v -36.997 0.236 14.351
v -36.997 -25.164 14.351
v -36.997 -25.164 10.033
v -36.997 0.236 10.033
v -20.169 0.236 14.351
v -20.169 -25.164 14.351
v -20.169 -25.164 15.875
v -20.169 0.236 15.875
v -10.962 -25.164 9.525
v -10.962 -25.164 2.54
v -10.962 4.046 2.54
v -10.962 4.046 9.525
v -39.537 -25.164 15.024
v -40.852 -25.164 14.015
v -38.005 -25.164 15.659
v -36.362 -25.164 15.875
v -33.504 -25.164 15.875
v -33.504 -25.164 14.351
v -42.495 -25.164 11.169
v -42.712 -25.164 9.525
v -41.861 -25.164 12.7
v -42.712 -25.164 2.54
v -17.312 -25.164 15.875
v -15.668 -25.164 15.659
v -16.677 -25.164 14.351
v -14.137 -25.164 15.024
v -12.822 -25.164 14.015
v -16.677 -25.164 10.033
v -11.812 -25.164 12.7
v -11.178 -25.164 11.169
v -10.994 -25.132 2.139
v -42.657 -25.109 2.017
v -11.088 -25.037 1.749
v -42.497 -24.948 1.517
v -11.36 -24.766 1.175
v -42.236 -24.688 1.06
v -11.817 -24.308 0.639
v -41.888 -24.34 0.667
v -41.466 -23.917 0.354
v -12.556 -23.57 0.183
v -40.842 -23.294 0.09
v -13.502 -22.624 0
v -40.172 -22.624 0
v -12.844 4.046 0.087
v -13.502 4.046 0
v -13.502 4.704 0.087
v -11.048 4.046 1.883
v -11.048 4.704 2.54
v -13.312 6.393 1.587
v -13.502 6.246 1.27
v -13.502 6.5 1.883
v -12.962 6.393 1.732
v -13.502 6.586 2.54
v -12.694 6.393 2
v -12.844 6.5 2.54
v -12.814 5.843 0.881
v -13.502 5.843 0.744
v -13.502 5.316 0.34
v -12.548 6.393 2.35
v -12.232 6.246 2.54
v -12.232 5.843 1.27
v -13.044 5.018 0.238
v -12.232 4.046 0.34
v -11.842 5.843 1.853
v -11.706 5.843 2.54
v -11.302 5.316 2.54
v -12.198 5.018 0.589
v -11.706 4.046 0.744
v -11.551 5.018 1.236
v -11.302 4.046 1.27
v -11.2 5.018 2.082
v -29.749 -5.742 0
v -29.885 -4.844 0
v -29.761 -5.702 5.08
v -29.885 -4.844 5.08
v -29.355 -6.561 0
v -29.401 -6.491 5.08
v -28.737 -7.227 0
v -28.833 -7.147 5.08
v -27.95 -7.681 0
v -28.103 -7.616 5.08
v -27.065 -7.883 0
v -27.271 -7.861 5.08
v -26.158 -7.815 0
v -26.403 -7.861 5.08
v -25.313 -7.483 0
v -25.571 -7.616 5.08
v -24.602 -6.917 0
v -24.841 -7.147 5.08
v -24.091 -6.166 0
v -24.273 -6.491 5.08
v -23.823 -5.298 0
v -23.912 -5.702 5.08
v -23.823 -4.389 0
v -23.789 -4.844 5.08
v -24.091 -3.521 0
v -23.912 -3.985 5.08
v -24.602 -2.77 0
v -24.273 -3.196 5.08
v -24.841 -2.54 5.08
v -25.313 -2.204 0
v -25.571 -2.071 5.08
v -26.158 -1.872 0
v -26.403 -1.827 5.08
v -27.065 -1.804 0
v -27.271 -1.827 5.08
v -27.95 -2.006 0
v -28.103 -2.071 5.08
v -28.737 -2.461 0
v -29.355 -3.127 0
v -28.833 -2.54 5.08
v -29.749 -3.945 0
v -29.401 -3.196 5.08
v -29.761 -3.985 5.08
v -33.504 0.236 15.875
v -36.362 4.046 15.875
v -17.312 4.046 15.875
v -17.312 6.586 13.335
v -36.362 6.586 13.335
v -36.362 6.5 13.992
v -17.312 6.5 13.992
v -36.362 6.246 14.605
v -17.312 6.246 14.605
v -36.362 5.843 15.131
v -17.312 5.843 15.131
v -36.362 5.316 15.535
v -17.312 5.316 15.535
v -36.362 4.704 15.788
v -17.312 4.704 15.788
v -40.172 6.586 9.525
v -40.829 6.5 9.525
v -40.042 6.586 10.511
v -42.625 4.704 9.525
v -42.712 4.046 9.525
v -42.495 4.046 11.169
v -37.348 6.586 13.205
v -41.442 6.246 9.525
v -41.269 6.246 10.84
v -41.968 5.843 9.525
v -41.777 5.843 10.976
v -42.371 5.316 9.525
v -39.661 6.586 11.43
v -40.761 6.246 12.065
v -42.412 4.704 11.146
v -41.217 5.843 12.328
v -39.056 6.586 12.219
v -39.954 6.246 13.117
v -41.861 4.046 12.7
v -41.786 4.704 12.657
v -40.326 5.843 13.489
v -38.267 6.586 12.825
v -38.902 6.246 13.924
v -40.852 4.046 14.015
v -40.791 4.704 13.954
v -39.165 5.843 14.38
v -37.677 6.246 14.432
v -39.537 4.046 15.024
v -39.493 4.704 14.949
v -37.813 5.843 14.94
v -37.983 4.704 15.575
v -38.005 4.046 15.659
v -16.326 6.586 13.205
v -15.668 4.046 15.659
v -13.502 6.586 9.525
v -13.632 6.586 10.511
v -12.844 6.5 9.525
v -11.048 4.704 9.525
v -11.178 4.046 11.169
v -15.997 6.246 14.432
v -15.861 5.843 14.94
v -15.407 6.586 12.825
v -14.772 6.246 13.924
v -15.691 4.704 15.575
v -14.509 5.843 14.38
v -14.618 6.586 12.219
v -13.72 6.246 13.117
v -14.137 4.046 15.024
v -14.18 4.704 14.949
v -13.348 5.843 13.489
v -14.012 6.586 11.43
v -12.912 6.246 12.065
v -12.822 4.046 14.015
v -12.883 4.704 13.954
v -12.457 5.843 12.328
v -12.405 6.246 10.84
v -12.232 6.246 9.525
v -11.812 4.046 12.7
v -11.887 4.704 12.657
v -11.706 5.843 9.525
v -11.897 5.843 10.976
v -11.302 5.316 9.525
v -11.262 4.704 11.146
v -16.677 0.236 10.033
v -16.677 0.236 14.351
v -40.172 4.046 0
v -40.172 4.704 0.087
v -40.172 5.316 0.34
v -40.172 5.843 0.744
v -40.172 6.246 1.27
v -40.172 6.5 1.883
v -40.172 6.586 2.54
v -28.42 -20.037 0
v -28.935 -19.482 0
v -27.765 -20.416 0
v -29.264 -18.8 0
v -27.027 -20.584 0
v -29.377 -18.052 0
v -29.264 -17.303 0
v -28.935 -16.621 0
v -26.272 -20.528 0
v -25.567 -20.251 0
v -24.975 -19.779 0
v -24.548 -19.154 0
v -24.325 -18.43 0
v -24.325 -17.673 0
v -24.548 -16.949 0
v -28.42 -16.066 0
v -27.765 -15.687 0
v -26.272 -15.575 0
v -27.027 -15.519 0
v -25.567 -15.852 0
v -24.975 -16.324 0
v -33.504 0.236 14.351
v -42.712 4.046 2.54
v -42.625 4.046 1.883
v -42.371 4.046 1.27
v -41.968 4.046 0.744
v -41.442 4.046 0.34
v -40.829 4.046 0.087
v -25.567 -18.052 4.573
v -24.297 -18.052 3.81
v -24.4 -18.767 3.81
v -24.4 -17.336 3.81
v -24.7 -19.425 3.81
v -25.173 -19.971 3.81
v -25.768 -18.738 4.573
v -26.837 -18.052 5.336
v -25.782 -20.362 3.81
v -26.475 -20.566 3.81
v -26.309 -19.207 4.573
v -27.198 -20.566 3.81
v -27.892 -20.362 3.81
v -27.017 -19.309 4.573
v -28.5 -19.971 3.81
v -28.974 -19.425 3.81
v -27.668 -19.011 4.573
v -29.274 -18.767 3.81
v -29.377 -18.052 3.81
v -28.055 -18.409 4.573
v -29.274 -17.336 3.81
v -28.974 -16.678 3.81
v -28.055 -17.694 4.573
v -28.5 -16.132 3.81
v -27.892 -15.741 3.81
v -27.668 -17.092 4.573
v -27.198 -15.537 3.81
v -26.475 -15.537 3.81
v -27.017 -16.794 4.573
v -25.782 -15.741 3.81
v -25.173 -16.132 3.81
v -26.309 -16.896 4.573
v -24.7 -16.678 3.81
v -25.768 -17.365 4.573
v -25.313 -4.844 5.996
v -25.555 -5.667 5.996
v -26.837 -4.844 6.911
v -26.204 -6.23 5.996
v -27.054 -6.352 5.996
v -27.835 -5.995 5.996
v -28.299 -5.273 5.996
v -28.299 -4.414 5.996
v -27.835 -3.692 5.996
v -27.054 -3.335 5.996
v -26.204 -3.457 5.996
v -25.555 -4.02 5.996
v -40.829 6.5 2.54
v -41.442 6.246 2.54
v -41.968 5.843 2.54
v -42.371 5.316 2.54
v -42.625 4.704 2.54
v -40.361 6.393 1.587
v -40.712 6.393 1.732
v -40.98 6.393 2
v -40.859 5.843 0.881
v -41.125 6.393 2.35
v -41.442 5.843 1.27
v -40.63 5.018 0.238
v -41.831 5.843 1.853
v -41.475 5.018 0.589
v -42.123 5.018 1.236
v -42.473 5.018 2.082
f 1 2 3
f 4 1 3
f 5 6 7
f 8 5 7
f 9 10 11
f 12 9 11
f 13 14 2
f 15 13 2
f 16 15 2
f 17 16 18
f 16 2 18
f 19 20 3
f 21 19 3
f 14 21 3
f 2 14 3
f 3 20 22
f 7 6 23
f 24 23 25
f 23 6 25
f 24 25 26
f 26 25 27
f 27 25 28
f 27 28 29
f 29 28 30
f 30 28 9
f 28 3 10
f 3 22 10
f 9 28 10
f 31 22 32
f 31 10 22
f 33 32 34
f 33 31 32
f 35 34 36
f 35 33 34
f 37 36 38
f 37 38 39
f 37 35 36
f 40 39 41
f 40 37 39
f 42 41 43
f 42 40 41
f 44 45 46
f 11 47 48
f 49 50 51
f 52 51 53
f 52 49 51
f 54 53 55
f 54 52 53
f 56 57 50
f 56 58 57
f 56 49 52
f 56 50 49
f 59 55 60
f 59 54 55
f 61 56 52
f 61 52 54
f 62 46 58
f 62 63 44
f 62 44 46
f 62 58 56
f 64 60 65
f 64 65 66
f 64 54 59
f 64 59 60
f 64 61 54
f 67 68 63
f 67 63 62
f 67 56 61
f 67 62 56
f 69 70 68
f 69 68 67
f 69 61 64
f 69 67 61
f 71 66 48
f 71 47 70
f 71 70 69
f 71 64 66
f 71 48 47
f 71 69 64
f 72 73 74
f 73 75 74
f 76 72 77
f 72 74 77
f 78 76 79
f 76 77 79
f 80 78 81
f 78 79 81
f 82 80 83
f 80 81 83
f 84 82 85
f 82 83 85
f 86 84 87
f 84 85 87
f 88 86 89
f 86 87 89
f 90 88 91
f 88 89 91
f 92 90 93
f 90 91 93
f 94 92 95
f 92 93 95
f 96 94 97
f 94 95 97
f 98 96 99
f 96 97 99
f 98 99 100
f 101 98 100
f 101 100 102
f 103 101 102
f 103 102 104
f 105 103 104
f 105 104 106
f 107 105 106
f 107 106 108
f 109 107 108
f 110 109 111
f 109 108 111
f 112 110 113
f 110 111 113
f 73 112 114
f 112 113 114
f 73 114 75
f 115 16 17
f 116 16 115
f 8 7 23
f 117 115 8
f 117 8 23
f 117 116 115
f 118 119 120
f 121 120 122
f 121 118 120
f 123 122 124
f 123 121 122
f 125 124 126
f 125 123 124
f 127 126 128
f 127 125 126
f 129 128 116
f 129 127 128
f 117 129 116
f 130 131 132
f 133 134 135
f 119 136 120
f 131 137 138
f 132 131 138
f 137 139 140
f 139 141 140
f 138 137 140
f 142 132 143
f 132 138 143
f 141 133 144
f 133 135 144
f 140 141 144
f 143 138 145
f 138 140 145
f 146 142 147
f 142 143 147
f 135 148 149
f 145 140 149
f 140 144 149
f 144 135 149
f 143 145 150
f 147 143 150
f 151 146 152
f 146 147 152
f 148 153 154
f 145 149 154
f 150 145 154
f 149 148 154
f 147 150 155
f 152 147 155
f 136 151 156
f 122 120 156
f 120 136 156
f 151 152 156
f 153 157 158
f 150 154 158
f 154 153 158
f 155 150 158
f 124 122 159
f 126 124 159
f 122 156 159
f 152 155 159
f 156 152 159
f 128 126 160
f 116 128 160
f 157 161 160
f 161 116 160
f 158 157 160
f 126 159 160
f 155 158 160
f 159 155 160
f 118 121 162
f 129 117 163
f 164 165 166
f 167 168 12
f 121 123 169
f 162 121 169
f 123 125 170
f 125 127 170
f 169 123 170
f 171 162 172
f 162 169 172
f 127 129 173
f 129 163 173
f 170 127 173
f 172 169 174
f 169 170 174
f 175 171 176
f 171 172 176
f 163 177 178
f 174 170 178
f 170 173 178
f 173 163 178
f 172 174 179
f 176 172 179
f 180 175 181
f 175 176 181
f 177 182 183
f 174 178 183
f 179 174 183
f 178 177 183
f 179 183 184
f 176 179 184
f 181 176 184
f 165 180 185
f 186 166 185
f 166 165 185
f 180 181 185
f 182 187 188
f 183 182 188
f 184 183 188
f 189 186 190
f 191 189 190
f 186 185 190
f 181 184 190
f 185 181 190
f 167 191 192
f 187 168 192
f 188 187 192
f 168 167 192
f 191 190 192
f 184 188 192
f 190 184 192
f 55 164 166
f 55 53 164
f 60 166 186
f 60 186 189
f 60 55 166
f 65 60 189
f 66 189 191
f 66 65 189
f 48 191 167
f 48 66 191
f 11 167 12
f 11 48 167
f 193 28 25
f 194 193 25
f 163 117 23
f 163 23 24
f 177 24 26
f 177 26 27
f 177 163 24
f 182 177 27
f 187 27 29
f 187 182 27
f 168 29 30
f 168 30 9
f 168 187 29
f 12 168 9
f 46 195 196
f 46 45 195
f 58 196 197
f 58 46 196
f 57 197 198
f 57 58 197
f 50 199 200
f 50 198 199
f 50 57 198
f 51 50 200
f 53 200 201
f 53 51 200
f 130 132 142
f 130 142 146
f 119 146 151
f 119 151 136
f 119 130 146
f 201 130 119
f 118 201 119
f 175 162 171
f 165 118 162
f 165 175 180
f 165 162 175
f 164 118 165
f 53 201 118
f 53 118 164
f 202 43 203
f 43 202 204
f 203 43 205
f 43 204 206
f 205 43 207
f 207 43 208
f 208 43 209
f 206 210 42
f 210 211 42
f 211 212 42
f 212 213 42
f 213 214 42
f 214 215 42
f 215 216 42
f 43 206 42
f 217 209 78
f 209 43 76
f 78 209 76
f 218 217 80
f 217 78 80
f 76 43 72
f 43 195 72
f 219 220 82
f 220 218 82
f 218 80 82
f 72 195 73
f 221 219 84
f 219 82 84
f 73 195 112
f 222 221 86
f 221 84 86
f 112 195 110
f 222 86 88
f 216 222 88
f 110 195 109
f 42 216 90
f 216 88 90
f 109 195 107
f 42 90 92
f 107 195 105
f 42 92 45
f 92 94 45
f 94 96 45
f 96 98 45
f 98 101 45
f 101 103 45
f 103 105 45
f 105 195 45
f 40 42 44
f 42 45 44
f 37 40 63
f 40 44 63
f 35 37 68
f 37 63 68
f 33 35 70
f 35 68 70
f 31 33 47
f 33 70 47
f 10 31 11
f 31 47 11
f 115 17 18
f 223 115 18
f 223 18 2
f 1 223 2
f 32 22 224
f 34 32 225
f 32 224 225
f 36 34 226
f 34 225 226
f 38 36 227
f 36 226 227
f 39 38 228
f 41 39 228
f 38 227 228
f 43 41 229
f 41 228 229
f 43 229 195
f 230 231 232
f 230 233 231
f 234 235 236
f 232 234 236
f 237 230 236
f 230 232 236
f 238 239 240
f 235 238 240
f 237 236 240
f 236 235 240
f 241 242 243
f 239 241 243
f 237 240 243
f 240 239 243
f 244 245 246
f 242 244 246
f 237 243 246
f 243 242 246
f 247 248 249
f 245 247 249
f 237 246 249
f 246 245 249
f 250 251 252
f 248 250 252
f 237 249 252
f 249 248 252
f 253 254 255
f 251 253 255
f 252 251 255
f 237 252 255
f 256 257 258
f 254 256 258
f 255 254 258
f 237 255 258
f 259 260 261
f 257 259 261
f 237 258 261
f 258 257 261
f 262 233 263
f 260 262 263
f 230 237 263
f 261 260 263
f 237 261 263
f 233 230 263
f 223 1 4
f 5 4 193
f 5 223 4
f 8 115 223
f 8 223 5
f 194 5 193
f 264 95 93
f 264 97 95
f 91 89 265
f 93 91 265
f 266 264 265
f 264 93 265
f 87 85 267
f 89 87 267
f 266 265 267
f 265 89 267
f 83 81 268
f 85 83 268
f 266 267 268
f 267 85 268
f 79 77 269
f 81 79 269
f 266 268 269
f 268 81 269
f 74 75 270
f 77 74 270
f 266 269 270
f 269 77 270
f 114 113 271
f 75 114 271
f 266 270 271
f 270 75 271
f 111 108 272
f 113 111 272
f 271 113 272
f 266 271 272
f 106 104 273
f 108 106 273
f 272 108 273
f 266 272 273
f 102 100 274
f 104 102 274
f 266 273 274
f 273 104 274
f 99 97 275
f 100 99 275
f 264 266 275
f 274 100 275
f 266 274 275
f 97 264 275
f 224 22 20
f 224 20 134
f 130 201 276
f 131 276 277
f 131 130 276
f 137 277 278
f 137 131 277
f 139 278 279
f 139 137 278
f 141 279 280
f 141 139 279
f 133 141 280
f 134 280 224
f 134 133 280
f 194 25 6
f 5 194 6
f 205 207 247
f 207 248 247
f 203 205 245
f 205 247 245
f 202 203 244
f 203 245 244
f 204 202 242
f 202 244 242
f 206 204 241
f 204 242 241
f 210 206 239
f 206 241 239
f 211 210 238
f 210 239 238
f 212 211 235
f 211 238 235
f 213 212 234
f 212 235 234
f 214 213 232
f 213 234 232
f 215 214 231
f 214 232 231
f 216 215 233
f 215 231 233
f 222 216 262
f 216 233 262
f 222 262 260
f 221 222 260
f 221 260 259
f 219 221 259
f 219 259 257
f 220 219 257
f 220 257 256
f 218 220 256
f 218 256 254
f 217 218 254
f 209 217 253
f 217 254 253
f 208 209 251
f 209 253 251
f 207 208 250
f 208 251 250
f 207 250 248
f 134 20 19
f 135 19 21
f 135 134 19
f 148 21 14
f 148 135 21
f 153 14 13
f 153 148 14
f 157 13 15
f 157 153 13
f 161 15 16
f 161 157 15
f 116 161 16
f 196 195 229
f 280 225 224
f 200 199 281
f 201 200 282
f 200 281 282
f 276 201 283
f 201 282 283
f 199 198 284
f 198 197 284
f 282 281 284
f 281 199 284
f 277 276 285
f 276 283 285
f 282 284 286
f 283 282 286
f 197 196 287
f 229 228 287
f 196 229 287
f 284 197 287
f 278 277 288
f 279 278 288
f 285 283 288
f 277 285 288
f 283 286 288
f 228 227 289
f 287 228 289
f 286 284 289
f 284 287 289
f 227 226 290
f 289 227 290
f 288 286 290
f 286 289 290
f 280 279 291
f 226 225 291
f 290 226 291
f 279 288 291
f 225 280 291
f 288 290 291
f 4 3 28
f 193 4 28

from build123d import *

# Parameters (mm, degrees)
F0_W     = 31.75
F0_H     = 31.75
F1_DEPTH = 15.875
F3_DEPTH = 25.4
F5_D     = 5.08
F5_DEPTH = 3.81
F5_TIP   = 1.5261859723
F7_D     = 6.096
F7_DEPTH = 5.08
F7_TIP   = 1.8314231668
F8_R     = 6.35
F9_R     = 2.54


with BuildPart() as f1:
    # F0 (on Top) → F1 (new body)
    with BuildSketch(Plane.XY):
        with Locations((-26.8367353499, -9.2885306659)):
            Rectangle(F0_W, F0_H)
    extrude(amount=F1_DEPTH)

    # F2 (on face) → F3 (cut)
    with BuildSketch(Plane.XZ.offset(25.1635306659)):
        Polygon((-20.1692353499, 15.875), (-33.5042353499, 15.875), (-33.5042353499, 14.351), (-36.9967353499, 14.351), (-36.9967353499, 10.033), (-16.6767353499, 10.033), (-16.6767353499, 14.351), (-20.1692353499, 14.351), align=None)
    extrude(amount=-F3_DEPTH, mode=Mode.SUBTRACT)

    # F5
    with Locations(Plane(origin=(0, 0, 0), x_dir=(1, 0, 0), z_dir=(0, 0, -1))):
        with Locations((-26.8367353499, 18.0515306659)):
            Hole(F5_D / 2, depth=F5_DEPTH)
            with Locations((0, 0, -(F5_DEPTH + F5_TIP / 2))):  # 118° drill point
                Cone(0, F5_D / 2, F5_TIP, mode=Mode.SUBTRACT)

    # F7
    with Locations(Plane(origin=(0, 0, 0), x_dir=(1, 0, 0), z_dir=(0, 0, -1))):
        with Locations((-26.8367353499, 4.8435306659)):
            Hole(F7_D / 2, depth=F7_DEPTH)
            with Locations((0, 0, -(F7_DEPTH + F7_TIP / 2))):  # 118° drill point
                Cone(0, F7_D / 2, F7_TIP, mode=Mode.SUBTRACT)

    # F8
    f8_edges = [f1.edges().sort_by_distance(p)[0] for p in [
        (-42.711735, -9.288531, 15.875),
        (-10.961735, -9.288531, 15.875),
    ]]
    fillet(f8_edges, radius=F8_R)

    # F9
    f9_edges = [f1.edges().sort_by_distance(p)[0] for p in [
        (-42.711735, -9.288531, 0),
        (-10.961735, -9.288531, 0),
        (-26.836735, -25.163531, 0),
        (-26.836735, 6.586469, 0),
        (-26.836735, 6.586469, 15.875),
    ]]
    fillet(f9_edges, radius=F9_R)


solid = f1.part
